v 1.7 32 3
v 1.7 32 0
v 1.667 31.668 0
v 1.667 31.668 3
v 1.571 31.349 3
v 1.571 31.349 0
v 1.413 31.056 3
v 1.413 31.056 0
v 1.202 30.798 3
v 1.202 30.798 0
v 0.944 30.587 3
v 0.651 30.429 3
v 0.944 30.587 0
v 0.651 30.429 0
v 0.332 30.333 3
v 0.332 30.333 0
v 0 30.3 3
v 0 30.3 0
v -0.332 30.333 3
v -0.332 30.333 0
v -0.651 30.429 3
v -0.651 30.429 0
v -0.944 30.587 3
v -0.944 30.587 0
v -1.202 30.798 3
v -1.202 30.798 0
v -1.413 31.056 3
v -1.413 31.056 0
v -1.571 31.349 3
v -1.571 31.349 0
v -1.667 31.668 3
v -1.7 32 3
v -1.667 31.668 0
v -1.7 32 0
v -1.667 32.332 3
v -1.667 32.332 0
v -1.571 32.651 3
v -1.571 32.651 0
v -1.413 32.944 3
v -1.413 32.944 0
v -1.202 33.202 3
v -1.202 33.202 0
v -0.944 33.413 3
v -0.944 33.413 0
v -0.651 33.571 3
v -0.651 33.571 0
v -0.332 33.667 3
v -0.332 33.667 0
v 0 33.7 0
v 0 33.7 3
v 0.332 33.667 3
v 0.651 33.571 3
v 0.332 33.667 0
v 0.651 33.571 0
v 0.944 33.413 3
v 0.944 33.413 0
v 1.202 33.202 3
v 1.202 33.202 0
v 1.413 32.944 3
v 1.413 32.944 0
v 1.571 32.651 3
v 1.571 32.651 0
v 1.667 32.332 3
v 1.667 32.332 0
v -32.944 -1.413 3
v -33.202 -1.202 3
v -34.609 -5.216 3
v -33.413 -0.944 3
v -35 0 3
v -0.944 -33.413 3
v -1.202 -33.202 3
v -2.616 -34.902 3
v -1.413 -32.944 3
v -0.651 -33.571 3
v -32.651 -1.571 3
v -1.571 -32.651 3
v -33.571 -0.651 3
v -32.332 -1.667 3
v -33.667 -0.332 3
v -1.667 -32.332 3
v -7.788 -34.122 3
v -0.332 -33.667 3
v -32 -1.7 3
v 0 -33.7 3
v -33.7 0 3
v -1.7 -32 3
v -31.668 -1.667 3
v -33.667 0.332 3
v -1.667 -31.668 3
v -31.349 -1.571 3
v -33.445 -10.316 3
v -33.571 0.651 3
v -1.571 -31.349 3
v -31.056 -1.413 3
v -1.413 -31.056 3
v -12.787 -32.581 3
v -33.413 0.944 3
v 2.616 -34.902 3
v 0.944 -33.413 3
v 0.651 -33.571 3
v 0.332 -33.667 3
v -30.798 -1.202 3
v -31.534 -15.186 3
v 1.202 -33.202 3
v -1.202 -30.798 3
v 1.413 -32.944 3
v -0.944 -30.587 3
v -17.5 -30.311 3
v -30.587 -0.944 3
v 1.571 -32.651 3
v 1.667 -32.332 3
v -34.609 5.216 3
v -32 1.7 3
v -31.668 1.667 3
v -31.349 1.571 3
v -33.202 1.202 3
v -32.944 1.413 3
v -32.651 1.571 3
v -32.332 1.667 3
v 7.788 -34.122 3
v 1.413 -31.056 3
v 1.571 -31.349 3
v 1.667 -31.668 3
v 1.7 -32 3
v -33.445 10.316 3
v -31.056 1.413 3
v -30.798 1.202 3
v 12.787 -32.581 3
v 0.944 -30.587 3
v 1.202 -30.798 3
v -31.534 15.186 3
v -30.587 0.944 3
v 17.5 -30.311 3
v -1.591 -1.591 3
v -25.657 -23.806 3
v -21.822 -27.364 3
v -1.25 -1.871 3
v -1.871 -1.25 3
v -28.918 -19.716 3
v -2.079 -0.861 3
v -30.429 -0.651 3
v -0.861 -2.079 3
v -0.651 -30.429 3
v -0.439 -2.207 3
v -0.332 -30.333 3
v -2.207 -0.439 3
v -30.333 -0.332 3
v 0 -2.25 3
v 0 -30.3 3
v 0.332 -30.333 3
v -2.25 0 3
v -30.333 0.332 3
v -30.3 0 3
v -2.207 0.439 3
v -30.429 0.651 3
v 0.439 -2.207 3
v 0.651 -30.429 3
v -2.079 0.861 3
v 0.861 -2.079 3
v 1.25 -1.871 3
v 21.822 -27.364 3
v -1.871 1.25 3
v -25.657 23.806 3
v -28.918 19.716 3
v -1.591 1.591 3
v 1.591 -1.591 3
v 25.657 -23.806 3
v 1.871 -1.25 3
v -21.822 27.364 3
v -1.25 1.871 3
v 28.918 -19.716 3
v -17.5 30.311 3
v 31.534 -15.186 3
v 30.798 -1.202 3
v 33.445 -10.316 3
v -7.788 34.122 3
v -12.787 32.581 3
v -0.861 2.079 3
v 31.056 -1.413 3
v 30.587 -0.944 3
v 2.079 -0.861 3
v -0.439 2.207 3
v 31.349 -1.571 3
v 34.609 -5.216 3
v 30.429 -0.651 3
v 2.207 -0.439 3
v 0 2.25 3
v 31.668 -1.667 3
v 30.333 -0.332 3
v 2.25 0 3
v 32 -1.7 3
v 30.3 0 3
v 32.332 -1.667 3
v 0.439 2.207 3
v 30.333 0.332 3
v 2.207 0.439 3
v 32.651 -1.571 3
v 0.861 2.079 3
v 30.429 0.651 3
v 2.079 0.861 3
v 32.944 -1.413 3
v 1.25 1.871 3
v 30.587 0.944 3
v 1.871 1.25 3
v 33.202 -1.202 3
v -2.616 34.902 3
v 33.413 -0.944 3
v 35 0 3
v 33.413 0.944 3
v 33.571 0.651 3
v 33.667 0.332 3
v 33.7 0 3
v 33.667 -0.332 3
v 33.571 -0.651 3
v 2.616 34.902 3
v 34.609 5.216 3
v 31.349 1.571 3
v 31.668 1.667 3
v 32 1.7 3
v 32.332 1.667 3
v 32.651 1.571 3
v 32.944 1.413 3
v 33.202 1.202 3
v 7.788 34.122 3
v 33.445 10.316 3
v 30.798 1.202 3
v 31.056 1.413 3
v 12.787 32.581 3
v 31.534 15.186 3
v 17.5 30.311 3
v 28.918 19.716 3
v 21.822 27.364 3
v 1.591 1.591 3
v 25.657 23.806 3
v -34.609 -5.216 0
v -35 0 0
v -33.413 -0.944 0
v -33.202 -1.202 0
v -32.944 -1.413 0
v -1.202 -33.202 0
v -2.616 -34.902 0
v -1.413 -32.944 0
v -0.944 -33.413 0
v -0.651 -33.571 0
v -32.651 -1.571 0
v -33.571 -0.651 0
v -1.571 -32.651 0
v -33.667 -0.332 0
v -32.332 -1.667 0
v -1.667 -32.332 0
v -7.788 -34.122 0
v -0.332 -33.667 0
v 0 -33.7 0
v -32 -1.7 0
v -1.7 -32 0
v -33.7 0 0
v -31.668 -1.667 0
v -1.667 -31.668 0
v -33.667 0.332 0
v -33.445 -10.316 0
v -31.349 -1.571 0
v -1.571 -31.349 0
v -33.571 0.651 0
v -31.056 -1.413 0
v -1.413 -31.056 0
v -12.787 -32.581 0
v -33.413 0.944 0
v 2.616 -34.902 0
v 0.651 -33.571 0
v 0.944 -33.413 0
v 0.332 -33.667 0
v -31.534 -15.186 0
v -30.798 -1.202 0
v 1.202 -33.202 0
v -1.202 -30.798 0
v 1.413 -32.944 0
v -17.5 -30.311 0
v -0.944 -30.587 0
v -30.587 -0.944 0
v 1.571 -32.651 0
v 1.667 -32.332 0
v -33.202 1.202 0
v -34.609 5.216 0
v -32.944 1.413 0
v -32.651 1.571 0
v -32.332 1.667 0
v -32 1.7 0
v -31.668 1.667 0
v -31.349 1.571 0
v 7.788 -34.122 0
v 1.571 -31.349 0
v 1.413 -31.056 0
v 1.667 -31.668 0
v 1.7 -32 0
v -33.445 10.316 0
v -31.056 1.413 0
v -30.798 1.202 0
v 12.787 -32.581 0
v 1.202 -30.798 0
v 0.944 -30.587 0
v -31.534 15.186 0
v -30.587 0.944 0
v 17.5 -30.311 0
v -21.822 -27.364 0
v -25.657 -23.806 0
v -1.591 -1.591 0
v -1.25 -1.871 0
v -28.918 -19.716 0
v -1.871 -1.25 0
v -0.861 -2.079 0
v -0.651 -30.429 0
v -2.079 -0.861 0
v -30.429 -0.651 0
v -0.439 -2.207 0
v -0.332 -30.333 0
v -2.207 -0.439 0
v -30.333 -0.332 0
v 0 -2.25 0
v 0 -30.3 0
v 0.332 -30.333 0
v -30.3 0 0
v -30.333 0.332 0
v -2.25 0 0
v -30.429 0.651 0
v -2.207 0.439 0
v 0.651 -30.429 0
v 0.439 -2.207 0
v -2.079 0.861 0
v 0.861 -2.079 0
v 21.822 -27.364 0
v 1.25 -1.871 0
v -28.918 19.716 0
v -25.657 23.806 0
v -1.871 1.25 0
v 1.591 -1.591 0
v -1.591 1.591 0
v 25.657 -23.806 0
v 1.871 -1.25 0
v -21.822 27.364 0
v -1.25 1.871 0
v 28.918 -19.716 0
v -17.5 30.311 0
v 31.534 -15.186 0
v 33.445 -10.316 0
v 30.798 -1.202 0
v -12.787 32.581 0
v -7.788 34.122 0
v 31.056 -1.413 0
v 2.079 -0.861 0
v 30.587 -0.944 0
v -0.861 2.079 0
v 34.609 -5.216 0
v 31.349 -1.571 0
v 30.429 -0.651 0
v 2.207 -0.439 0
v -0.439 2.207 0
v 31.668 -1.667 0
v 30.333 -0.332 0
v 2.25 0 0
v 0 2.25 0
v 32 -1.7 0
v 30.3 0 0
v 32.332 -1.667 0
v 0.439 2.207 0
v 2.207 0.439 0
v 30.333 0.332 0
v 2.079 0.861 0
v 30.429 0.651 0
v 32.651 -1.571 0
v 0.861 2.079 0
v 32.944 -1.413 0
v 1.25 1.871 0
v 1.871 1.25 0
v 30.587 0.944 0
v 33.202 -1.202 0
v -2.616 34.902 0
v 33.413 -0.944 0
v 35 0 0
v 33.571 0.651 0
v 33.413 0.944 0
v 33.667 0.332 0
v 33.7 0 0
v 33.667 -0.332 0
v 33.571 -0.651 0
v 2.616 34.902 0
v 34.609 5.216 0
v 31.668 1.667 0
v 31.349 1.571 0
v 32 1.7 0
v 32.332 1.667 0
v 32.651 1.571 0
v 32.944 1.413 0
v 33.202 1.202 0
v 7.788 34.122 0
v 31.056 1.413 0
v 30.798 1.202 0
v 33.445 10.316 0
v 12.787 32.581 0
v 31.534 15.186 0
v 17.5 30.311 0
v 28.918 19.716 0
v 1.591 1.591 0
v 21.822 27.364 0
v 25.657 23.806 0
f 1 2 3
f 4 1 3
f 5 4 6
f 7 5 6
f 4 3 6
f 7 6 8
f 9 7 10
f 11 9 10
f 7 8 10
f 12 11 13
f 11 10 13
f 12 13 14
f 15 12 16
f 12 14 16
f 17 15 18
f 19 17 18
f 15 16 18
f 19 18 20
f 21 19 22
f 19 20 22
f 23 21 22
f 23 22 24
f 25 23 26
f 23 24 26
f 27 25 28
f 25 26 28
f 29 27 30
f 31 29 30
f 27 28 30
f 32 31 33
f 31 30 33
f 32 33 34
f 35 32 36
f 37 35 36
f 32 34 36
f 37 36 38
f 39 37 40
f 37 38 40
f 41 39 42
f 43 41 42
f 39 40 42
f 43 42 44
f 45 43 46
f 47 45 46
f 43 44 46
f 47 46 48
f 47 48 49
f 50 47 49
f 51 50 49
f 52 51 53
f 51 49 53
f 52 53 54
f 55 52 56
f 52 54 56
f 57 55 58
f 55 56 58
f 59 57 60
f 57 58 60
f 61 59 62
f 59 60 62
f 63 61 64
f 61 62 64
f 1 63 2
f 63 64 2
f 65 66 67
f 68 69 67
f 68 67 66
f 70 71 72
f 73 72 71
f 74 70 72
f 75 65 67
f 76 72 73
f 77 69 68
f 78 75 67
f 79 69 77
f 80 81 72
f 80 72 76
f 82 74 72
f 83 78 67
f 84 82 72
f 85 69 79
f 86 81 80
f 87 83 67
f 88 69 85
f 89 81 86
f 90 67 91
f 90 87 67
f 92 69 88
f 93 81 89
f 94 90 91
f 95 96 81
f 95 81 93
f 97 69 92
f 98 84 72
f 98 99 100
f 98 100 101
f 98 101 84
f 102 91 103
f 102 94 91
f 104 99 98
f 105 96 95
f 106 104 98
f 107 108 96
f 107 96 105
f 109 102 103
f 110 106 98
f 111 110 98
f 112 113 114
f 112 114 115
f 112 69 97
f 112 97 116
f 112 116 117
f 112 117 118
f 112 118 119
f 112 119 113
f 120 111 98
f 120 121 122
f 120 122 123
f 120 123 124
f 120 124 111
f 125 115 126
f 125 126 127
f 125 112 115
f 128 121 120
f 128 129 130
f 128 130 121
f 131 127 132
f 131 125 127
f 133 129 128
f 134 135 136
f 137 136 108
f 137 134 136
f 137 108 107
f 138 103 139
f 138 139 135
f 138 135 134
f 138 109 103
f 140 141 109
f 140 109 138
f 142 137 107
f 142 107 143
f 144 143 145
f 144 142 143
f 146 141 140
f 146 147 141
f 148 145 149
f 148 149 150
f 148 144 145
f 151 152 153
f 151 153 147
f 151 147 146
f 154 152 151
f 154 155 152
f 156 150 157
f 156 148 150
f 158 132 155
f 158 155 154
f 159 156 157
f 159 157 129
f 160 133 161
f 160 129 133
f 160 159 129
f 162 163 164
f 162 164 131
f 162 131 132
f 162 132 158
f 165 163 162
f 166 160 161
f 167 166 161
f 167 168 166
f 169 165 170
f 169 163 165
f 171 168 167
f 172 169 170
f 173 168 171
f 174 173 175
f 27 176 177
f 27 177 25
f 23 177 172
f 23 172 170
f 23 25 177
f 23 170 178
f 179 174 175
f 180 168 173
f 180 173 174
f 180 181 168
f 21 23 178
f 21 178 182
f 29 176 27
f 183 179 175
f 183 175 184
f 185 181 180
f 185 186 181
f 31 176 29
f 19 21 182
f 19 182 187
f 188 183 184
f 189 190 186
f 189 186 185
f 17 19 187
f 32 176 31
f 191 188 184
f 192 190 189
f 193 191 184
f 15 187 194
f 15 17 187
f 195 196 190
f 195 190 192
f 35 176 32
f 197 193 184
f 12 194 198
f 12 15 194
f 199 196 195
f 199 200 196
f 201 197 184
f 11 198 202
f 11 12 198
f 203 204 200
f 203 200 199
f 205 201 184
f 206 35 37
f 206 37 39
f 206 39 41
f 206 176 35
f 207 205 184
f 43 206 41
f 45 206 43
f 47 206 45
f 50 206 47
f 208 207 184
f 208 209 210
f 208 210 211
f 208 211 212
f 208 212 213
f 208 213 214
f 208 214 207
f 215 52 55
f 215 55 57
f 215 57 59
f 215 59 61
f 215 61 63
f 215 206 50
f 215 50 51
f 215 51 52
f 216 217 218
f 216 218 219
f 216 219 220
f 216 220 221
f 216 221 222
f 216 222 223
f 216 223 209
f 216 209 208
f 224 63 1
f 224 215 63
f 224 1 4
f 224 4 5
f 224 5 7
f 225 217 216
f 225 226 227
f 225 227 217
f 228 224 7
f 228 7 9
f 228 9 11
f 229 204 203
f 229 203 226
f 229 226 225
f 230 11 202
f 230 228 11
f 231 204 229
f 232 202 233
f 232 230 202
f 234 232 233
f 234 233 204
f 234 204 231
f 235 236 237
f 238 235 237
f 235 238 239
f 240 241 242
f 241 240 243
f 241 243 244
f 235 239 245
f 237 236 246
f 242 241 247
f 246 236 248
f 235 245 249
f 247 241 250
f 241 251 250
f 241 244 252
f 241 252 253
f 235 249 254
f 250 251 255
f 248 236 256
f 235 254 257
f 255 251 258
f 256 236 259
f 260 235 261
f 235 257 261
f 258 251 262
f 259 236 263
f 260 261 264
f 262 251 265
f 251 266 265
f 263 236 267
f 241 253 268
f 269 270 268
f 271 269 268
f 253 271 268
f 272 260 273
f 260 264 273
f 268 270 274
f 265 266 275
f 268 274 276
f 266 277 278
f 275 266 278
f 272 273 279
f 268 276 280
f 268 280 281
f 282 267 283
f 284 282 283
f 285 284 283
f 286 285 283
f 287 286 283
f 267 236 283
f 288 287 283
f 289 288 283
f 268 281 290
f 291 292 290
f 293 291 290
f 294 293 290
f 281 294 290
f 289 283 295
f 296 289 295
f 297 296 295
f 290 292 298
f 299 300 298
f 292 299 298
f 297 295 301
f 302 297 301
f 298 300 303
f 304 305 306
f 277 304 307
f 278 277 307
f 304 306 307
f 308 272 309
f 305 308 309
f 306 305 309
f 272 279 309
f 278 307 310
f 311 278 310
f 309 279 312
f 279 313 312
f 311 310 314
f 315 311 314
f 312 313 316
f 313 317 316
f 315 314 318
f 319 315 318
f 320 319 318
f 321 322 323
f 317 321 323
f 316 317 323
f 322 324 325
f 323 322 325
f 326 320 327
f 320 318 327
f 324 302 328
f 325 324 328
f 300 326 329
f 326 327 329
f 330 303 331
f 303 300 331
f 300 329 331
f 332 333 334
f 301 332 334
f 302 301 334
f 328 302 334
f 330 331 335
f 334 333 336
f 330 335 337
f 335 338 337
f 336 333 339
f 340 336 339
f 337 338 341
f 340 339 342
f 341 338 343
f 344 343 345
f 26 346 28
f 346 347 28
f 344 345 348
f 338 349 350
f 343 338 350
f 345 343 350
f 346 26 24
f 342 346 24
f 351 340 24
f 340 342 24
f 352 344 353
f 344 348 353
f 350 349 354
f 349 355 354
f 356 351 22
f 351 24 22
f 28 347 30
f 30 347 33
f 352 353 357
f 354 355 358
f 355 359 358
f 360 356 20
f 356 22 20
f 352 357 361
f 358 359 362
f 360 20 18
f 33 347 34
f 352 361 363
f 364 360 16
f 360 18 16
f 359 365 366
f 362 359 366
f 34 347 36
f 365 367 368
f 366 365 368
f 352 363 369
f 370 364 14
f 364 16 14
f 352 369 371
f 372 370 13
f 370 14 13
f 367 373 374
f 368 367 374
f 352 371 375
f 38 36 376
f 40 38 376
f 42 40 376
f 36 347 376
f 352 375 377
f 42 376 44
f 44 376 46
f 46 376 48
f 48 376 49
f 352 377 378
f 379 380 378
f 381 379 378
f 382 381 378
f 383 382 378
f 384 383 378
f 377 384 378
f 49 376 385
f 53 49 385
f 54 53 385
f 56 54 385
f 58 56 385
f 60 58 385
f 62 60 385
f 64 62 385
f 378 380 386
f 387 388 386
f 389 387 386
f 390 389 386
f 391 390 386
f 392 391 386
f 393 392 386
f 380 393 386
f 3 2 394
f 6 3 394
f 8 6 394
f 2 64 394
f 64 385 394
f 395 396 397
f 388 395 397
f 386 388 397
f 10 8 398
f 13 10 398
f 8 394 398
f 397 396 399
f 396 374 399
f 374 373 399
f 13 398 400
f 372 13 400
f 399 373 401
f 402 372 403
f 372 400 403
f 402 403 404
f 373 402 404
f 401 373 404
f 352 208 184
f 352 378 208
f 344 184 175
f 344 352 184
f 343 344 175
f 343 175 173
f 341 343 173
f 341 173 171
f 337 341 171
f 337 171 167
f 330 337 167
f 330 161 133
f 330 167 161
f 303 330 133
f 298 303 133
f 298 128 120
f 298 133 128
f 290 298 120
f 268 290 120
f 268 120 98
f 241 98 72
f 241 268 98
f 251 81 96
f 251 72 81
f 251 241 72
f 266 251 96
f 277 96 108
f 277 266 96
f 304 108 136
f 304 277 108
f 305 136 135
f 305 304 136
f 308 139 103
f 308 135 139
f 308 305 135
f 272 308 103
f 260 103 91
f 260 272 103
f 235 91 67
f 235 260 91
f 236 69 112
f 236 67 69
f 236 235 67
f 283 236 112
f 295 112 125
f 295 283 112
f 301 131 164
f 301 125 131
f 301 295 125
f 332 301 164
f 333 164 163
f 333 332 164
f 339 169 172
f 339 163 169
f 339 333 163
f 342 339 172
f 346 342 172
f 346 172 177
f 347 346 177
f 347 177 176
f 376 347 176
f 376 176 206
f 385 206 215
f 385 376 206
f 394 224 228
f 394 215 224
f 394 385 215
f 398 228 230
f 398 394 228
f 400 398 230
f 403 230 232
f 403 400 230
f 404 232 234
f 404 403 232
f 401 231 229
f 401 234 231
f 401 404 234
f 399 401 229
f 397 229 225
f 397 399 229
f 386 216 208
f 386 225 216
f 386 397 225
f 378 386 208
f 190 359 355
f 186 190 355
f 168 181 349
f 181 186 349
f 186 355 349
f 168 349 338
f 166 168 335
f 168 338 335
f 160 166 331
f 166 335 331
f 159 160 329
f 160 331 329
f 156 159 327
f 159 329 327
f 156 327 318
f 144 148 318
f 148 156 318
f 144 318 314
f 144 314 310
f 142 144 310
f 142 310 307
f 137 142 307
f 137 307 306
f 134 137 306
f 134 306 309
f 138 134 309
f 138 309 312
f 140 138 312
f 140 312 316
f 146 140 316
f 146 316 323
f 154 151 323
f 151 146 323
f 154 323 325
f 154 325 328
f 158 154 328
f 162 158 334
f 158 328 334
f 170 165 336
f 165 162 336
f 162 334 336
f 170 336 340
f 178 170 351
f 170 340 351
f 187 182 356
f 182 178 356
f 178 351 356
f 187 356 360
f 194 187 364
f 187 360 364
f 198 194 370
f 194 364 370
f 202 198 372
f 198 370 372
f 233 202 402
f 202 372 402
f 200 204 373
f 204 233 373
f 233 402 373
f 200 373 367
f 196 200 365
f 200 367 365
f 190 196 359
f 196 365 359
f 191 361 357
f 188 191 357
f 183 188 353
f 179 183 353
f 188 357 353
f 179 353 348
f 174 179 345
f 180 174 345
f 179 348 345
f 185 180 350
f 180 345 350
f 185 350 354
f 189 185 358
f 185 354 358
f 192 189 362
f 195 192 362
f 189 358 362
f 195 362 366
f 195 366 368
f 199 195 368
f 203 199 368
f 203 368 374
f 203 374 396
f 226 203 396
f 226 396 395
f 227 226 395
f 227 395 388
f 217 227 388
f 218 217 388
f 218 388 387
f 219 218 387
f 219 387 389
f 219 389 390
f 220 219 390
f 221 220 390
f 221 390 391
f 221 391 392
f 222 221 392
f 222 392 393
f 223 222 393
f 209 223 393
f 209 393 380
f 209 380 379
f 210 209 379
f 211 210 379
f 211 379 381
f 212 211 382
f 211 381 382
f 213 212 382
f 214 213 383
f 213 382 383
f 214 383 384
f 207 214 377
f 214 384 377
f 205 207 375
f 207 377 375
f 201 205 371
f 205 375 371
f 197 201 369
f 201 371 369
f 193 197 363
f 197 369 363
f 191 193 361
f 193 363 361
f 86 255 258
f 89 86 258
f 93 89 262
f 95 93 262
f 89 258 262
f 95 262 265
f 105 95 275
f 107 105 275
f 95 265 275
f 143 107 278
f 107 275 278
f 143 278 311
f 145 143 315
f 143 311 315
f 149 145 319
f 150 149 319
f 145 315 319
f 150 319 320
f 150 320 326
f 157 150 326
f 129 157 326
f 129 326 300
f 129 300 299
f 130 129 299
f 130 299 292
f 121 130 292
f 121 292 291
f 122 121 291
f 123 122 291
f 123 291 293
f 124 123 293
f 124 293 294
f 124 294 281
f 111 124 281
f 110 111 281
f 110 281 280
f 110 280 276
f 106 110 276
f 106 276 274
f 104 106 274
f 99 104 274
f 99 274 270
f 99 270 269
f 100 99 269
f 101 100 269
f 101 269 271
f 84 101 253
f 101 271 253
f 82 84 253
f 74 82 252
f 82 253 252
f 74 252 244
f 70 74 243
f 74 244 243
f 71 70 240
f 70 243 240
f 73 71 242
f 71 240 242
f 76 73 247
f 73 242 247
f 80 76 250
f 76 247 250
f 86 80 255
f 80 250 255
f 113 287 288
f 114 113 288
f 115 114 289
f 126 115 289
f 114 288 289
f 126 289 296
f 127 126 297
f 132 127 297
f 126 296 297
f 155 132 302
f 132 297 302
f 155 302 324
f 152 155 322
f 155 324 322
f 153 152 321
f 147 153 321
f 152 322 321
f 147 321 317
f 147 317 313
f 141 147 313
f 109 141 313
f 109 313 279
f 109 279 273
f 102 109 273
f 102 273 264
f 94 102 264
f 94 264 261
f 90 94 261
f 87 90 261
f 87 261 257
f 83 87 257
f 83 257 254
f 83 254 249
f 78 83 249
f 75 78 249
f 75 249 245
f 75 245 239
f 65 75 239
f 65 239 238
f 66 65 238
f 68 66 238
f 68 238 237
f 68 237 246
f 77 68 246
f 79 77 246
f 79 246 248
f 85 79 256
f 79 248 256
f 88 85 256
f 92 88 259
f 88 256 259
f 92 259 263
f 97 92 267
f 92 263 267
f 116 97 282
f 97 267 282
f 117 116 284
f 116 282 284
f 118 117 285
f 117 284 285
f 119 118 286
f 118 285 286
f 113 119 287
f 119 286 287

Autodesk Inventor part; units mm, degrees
ref_plane "YZ Plane" through (0, 0, 0) normal (1, 0, 0) x (0, 1, 0)
ref_plane "XZ Plane" through (0, 0, 0) normal (0, 1, 0) x (-1, 0, 0)
ref_plane "XY Plane" through (0, 0, 0) normal (0, 0, 1) x (1, 0, 0)
sketch "Sketch1" plane through (0, 0, 0) normal (0, 0, 1) x (1, 0, 0)
  circle A0 centre (0, 0) radius 35
  circle A1 centre (0, 0) radius 2.25
  dimension "d0" = 70
  dimension "d1" = 4.5
extrude "Extrusion1" add sketch "Sketch1" along normal blind 3
sketch "Sketch2" plane through (0, 0, 3) normal (0, 0, 1) x (1, 0, 0)
  circle A0 centre (0, 0) radius 32 construction
  point P0 (32, 0)
  dimension "d4" = 64
hole "Hole1" at (32, 0, 3) direction (0, 0, -1) diameter 3.4 end through all
pattern_circular "Circular Pattern1" count 4 over 360 about axis through (0, 0, 0) along (0, 0, 1) of "Hole1"
properties part number "plasma-box-anode-flange" material "Copper"
